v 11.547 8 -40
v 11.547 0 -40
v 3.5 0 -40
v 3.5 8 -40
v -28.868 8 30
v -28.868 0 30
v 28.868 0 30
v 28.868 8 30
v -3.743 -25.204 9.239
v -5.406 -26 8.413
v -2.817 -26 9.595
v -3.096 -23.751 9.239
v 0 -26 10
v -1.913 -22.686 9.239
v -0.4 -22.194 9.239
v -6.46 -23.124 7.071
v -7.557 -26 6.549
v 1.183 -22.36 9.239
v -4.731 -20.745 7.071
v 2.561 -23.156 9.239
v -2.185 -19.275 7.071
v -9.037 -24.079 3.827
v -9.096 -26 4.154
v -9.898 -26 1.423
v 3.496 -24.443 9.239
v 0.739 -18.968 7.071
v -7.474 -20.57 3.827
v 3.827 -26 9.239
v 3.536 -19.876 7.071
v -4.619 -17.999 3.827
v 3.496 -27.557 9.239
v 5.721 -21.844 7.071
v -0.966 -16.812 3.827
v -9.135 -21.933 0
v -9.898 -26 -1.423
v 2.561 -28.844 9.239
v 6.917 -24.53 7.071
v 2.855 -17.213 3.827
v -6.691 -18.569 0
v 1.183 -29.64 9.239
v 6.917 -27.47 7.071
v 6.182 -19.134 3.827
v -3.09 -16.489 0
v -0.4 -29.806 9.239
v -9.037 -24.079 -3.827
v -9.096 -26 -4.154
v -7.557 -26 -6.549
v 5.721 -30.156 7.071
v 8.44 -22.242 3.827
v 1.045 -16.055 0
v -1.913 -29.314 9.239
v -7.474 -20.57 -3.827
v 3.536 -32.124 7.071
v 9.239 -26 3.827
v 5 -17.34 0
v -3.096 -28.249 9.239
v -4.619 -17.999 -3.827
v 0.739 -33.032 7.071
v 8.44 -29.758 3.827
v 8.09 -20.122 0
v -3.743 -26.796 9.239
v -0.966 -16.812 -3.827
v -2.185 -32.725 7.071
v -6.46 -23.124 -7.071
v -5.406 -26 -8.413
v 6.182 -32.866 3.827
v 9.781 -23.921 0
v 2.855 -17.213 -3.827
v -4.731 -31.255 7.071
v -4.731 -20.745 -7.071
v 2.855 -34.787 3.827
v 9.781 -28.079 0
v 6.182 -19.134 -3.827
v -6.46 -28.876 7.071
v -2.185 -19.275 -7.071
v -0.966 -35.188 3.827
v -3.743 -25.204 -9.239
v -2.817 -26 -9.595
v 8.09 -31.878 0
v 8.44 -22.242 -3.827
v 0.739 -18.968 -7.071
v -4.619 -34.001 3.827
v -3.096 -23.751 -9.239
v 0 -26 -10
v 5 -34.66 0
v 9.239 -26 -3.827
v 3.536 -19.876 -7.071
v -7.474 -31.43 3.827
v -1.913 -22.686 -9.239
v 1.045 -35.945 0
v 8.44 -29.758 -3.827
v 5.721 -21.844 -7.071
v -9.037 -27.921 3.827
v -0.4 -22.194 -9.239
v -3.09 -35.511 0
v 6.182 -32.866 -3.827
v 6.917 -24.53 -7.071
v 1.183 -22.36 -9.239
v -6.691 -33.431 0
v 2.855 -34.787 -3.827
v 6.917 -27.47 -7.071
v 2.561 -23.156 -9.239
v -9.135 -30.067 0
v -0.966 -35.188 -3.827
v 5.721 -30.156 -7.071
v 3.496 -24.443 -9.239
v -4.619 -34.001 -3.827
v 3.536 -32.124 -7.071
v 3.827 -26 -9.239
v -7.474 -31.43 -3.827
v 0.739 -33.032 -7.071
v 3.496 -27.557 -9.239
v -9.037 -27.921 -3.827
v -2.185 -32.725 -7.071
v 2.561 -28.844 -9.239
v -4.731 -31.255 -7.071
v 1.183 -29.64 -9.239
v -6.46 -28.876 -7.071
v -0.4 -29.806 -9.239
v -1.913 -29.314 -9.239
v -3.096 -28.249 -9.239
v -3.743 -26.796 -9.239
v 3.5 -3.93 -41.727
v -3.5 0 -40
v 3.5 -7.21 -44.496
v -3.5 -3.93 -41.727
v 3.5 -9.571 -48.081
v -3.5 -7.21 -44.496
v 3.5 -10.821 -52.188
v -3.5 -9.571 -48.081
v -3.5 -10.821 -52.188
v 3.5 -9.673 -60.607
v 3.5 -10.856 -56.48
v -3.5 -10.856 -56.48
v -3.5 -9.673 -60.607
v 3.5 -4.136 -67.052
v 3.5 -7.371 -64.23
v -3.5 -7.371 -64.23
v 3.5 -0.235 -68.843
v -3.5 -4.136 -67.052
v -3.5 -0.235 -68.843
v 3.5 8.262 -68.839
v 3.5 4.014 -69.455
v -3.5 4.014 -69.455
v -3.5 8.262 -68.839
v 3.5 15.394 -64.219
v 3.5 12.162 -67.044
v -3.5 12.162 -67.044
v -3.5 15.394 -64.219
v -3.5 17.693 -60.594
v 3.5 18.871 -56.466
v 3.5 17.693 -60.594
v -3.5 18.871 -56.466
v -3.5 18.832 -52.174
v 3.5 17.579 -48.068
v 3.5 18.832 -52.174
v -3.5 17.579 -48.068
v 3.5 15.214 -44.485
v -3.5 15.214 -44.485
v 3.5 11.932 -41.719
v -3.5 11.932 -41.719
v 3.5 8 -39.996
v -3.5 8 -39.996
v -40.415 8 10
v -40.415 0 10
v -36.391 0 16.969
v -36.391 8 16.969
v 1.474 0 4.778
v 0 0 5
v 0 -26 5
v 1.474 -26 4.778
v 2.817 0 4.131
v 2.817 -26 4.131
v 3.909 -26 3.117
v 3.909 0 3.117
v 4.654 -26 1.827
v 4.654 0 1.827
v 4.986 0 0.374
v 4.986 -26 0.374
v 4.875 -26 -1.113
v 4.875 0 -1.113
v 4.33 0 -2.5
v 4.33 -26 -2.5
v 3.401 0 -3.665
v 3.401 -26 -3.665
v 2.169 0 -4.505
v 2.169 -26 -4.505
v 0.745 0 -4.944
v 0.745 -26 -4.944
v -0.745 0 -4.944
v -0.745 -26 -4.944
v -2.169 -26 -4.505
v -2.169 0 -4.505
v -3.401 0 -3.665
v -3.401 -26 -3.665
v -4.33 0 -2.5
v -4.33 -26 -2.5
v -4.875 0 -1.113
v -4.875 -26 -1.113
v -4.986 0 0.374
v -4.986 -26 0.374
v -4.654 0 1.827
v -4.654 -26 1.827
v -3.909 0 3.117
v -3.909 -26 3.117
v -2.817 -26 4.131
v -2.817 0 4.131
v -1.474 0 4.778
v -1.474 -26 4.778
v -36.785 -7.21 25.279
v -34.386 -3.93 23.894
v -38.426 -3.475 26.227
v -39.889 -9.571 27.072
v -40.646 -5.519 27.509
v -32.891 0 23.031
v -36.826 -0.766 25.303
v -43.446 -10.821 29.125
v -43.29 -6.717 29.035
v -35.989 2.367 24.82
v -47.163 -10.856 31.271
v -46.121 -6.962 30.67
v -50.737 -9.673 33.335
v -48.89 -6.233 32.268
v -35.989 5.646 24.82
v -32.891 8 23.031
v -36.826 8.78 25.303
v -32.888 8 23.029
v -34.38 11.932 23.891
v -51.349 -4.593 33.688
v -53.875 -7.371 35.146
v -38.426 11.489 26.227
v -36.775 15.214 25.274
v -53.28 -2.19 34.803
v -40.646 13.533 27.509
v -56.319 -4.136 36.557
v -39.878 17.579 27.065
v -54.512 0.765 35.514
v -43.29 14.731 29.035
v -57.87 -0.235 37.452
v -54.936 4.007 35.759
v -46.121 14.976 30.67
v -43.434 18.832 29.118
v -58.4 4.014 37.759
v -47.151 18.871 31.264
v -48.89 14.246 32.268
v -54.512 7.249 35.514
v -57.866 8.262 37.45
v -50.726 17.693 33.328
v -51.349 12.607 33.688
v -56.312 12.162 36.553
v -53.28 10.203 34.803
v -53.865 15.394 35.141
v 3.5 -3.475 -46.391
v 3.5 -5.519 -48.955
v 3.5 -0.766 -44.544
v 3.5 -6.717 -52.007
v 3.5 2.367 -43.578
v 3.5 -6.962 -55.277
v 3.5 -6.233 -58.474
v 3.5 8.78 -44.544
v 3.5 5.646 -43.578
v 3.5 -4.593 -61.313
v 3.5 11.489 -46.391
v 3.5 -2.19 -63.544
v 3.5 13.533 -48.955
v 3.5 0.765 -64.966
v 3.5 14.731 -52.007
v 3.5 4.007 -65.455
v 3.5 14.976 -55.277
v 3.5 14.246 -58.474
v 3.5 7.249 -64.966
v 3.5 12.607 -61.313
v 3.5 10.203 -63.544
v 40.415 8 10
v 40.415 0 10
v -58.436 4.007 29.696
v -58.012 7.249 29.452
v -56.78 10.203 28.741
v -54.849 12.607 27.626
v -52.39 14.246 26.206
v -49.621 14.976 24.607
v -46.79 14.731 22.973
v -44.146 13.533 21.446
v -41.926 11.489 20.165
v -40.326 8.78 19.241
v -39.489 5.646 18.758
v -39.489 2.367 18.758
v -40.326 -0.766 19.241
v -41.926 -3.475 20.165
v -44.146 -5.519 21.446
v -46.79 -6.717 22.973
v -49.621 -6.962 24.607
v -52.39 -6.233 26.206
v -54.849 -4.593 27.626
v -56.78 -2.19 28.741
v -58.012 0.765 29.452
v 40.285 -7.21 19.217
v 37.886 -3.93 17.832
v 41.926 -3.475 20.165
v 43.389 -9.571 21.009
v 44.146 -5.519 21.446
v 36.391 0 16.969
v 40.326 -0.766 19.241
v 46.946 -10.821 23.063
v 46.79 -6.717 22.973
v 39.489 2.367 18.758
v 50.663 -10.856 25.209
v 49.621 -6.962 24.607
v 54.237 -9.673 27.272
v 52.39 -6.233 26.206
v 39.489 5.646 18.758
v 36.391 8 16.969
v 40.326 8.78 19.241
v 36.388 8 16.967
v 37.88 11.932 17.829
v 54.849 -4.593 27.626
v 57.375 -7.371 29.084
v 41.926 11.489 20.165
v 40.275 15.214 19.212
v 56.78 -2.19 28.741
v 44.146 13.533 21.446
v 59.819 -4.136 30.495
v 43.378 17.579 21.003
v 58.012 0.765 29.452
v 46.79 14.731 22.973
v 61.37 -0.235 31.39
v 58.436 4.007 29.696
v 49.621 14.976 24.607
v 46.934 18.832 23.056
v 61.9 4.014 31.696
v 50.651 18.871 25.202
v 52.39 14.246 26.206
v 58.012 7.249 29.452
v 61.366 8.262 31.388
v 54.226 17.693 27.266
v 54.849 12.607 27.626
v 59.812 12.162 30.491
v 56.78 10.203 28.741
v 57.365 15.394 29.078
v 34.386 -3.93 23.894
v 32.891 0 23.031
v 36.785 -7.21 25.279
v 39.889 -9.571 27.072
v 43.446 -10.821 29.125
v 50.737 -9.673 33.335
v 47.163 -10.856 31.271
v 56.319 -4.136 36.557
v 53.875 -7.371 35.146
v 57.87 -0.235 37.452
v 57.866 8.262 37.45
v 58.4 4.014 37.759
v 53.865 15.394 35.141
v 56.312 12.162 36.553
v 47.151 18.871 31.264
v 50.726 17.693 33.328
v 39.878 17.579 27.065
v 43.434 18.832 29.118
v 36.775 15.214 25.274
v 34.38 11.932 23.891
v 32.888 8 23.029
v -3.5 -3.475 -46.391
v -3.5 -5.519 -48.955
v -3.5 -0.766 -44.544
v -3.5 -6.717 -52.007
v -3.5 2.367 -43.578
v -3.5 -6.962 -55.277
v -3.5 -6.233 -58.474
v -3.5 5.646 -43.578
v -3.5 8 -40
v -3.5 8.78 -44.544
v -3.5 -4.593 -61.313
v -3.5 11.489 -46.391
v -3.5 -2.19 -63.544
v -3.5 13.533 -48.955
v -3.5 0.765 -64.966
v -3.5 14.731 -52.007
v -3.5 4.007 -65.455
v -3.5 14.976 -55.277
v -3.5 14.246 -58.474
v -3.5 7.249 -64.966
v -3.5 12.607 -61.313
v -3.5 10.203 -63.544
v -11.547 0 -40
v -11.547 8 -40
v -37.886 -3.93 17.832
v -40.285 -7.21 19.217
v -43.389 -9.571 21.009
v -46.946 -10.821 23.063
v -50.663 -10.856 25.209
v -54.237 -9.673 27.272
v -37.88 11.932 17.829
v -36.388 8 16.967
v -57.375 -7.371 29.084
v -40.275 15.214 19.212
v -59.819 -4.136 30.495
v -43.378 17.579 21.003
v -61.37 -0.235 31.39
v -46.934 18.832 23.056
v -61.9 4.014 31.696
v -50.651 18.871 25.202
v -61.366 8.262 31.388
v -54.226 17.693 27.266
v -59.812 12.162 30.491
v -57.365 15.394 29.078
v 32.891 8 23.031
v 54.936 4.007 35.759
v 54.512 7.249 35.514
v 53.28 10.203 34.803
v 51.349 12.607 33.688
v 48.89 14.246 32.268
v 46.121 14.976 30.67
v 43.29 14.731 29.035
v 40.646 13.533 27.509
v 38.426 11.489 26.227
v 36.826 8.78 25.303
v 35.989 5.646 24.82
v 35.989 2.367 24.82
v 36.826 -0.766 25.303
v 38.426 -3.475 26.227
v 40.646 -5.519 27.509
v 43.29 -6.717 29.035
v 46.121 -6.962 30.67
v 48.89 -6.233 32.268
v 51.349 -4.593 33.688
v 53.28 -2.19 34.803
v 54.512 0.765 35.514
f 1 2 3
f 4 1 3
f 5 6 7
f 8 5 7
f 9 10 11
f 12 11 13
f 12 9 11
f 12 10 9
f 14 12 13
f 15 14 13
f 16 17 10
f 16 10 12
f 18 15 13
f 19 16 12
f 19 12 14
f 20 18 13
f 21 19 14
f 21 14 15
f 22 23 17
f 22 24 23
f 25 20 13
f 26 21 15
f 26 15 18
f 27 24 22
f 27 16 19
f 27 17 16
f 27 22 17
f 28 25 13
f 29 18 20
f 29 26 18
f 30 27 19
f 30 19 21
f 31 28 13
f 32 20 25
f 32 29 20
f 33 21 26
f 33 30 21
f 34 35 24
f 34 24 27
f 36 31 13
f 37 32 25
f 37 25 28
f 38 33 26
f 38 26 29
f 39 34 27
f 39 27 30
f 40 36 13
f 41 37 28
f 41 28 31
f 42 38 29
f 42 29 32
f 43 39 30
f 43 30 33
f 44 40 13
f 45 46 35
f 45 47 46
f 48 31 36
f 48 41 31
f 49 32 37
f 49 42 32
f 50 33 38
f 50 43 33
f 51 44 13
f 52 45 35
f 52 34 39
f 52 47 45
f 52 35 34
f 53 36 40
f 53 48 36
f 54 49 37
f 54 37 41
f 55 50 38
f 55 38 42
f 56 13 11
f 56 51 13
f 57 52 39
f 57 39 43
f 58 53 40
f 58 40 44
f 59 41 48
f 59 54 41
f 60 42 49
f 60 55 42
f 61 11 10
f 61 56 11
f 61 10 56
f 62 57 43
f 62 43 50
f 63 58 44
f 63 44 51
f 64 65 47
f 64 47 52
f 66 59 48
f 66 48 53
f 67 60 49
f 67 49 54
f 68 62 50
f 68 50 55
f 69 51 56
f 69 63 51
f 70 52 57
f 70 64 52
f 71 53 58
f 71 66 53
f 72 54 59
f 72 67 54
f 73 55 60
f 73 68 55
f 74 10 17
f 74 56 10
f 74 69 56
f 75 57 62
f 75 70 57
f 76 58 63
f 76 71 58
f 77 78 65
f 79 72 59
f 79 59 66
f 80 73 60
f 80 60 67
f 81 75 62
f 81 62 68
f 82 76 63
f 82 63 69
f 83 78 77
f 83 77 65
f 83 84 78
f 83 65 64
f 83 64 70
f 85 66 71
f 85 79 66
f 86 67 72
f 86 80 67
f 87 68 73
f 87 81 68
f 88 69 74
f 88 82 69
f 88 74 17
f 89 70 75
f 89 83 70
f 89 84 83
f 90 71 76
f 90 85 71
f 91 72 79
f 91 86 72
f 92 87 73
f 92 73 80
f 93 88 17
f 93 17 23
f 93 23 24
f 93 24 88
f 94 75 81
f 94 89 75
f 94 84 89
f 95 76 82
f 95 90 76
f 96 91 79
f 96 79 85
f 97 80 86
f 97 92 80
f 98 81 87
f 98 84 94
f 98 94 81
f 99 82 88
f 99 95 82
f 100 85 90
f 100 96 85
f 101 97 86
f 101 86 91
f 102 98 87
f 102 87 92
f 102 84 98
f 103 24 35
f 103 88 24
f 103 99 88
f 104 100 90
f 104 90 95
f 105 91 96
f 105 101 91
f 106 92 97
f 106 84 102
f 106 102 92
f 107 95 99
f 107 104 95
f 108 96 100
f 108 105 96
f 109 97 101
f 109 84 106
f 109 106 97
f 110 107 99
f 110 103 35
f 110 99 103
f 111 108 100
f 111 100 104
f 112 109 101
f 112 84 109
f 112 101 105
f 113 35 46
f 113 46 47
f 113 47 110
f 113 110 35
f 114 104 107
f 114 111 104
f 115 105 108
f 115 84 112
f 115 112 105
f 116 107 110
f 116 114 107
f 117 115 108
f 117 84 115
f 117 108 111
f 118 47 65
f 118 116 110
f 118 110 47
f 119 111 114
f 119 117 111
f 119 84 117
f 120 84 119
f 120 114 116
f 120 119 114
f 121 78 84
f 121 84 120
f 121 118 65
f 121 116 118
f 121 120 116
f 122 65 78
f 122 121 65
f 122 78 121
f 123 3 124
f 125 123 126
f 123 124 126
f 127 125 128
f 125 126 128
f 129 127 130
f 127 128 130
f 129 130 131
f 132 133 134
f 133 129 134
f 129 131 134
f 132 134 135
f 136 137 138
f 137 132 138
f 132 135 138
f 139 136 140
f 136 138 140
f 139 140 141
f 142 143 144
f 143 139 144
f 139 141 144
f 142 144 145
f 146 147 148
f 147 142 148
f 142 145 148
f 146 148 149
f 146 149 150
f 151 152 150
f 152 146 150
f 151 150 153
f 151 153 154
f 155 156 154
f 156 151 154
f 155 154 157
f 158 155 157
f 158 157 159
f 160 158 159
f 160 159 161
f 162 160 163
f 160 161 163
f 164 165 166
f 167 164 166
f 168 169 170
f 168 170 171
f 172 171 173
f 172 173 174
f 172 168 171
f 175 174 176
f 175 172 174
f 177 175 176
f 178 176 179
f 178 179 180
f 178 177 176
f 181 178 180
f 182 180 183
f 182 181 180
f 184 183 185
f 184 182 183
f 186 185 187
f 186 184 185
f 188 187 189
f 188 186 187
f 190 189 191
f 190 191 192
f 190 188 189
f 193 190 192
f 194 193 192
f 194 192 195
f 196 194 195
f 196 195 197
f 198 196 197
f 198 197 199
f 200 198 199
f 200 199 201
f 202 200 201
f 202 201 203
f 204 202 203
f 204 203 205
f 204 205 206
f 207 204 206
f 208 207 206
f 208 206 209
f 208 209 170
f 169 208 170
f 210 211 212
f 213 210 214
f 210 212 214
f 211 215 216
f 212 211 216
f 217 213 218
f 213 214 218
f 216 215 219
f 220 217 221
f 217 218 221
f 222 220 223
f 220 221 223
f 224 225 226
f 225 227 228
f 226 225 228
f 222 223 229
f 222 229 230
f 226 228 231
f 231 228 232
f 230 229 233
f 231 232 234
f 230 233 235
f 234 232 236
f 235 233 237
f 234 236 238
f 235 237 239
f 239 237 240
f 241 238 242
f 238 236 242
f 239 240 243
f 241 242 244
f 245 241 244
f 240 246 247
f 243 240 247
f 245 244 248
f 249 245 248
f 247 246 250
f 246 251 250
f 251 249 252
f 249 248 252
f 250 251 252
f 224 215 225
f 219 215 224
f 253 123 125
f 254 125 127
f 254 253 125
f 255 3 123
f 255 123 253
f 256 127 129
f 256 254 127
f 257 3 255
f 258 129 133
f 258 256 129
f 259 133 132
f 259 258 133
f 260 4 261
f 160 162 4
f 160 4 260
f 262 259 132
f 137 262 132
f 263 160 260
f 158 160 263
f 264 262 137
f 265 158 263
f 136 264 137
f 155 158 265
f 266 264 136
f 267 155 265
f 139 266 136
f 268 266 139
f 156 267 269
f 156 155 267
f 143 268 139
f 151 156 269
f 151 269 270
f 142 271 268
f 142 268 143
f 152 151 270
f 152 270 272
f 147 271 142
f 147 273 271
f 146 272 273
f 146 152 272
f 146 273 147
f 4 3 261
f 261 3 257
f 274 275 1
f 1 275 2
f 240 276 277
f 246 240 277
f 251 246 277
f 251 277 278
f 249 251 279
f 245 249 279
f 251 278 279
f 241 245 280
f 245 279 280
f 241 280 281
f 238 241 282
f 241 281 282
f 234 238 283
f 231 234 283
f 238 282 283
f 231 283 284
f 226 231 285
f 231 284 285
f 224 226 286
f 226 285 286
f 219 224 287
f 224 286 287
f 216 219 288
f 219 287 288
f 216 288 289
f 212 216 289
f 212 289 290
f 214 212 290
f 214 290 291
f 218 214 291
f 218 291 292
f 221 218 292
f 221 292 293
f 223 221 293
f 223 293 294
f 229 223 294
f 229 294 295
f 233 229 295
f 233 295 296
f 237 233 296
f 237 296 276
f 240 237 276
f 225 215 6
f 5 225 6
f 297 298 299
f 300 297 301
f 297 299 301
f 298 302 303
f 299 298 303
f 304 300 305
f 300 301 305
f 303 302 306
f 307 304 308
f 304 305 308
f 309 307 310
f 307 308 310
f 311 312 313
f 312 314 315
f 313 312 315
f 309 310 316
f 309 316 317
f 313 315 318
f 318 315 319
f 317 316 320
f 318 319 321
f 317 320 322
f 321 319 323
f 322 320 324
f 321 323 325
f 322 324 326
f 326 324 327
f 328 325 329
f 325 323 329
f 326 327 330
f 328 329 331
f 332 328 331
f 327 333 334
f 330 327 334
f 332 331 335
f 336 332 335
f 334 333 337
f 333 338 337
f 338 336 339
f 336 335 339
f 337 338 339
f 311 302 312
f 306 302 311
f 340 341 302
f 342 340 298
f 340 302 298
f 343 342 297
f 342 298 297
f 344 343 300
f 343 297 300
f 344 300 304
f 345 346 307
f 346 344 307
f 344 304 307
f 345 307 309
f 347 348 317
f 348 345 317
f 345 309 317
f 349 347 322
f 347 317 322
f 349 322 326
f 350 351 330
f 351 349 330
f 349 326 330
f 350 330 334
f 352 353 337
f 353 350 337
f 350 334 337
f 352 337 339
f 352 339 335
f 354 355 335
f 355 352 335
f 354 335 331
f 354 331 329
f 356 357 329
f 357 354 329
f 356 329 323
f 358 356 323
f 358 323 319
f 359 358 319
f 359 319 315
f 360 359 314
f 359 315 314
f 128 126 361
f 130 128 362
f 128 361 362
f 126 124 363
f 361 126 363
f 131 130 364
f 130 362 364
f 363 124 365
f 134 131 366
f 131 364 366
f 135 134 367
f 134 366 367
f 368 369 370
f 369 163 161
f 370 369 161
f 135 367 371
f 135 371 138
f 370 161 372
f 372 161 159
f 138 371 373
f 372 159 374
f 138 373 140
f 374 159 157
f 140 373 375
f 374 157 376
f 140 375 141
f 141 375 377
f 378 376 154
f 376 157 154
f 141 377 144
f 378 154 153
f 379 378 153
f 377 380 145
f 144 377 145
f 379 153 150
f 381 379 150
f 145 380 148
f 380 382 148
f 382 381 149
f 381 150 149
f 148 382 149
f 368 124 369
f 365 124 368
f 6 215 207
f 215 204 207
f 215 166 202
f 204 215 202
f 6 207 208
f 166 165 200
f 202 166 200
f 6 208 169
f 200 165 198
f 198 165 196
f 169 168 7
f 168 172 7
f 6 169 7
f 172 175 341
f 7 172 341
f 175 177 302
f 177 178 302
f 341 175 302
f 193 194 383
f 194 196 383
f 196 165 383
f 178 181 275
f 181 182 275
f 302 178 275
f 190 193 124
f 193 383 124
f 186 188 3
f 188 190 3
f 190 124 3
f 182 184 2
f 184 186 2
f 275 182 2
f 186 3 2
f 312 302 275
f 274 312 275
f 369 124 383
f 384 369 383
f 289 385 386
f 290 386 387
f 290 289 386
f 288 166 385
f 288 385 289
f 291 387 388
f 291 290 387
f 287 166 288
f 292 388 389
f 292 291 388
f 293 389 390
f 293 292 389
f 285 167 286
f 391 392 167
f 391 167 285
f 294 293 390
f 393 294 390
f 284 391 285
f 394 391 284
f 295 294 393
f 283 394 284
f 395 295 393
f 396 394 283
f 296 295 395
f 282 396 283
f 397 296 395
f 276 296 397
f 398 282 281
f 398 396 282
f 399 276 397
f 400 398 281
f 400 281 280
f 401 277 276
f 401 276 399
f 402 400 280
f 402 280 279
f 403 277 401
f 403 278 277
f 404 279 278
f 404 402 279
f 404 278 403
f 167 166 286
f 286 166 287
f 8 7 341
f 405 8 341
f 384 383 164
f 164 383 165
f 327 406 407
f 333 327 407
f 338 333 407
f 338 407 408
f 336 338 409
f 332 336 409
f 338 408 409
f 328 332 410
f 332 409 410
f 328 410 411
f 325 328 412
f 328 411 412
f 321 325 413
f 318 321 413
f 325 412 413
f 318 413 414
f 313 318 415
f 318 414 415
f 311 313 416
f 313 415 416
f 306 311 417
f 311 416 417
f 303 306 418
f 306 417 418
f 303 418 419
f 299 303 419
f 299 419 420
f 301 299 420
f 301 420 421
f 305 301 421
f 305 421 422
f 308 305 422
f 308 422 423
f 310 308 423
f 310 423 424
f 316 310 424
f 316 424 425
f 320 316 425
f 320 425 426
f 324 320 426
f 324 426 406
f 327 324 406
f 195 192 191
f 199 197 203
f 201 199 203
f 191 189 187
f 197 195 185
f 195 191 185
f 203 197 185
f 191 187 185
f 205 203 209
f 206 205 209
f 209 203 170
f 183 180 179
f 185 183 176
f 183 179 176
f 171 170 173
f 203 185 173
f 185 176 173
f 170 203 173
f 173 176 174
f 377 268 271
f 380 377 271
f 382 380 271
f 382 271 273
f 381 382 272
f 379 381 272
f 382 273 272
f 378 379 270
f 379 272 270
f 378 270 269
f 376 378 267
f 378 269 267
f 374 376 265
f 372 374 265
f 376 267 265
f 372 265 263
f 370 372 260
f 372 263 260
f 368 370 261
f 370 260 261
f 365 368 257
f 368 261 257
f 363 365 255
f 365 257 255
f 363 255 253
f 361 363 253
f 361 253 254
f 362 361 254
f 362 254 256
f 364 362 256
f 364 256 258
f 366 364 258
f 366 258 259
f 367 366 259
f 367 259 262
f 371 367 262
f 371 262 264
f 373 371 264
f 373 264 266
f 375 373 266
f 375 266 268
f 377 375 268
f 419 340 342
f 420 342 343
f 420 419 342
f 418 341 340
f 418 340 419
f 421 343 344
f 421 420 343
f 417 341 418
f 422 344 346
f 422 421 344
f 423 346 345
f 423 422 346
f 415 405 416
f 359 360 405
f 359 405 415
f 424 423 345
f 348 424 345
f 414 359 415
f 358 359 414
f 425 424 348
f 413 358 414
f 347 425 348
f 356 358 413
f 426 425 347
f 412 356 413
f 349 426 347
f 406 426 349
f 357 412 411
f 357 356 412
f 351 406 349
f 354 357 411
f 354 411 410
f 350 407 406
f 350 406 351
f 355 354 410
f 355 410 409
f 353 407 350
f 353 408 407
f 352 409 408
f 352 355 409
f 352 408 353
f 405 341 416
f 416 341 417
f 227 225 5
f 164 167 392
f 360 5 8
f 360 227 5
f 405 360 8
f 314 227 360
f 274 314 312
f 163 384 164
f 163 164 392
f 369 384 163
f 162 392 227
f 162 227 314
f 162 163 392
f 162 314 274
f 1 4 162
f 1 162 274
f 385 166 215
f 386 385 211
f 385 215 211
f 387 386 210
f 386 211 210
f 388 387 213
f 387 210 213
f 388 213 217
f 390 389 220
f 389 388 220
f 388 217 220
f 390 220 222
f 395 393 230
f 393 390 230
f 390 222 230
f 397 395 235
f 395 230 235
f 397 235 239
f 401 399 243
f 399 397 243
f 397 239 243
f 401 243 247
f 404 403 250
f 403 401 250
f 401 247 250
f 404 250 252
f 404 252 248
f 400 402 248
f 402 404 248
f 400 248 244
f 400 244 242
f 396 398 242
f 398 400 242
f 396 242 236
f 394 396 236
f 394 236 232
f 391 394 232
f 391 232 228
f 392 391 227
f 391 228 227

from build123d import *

# Parameters (mm, degrees)
BOSS_EXTRUDE1_DEPTH      = 8
SKETCH2_R                = 5
CUT_EXTRUDE1_DEPTH       = 107
BOSS_EXTRUDE2_DEPTH      = 3.5
BOSS_EXTRUDE2_DEPTH_BACK = 3.5
SKETCH3_R                = 15
SKETCH4_R                = 11
CUT_EXTRUDE2_DEPTH       = 19.5
CIRPATTERN1_COUNT        = 3
SKETCH6_R                = 5
BOSS_EXTRUDE3_DEPTH      = 34


with BuildPart() as part:
    # Sketch1 → Boss-Extrude1 (new body)
    with BuildSketch(Plane(origin=(0, 0, 0), x_dir=(1, 0, 0), z_dir=(0, 1, 0))):
        Polygon((-11.547005384, 40), (-40.414518843, -10), (-28.867513459, -30), (28.867513459, -30), (40.414518843, -10), (11.547005384, 40), align=None)
    extrude(amount=BOSS_EXTRUDE1_DEPTH)

    # Sketch2 → Cut-Extrude1 (cut)
    with BuildSketch(Plane(origin=(0, 8, 0), x_dir=(1, 0, 0), z_dir=(0, 1, 0))):
        Circle(SKETCH2_R)
    extrude(amount=-CUT_EXTRUDE1_DEPTH, mode=Mode.SUBTRACT)

    # Sketch3 → Boss-Extrude2 (add, two sides: drawn at the far end of the back side and taken through both)
    with BuildSketch(Plane(origin=(0, 0, 0), x_dir=(0, 0, -1), z_dir=(1, 0, 0)).offset(-BOSS_EXTRUDE2_DEPTH_BACK)):
        with Locations((54.454926612, 4.00688116)):
            Circle(SKETCH3_R)
    extrude(amount=BOSS_EXTRUDE2_DEPTH + BOSS_EXTRUDE2_DEPTH_BACK)

    # Sketch4 → Cut-Extrude2 (cut)
    with BuildSketch(Plane(origin=(3.5, 0, 0), x_dir=(0, 0, -1), z_dir=(1, 0, 0))):
        with Locations((54.454926612, 4.00688116)):
            Circle(SKETCH4_R)
    extrude(amount=-CUT_EXTRUDE2_DEPTH, mode=Mode.SUBTRACT)


with BuildPart() as cirpattern1_1:
    # CirPattern1: pattern copy
    add(part.part.rotate(Axis((0, -99, 0), (0, 1, 0)), 1 * 360 / CIRPATTERN1_COUNT))


with BuildPart() as cirpattern1_2:
    # CirPattern1: pattern copy
    add(part.part.rotate(Axis((0, -99, 0), (0, 1, 0)), 2 * 360 / CIRPATTERN1_COUNT))


with BuildPart() as part_1:
    add(part.part)

    add(cirpattern1_1.part)  # Boss-Extrude3 merges CirPattern1_1

    add(cirpattern1_2.part)  # Boss-Extrude3 merges CirPattern1_2
    # Sketch6 → Boss-Extrude3 (add)
    with BuildSketch(Plane(origin=(0, 8, 0), x_dir=(1, 0, 0), z_dir=(0, 1, 0))):
        Circle(SKETCH6_R)
    extrude(amount=-BOSS_EXTRUDE3_DEPTH)


with BuildPart() as body_2:
    # Sketch8 → Revolve1 (revolve)
    with BuildSketch(Plane(origin=(0, -26, 0), x_dir=(-1, 0, 0), z_dir=(0, -1, 0))):
        with BuildLine():
            Line((0, 10), (0, -10))
            ThreePointArc((0, -10), (10, 0), (0, 10))
        make_face()
    revolve(axis=Axis((0, -26, 0), (0, 0, -1)))


solid = Compound([part_1.part, body_2.part])
